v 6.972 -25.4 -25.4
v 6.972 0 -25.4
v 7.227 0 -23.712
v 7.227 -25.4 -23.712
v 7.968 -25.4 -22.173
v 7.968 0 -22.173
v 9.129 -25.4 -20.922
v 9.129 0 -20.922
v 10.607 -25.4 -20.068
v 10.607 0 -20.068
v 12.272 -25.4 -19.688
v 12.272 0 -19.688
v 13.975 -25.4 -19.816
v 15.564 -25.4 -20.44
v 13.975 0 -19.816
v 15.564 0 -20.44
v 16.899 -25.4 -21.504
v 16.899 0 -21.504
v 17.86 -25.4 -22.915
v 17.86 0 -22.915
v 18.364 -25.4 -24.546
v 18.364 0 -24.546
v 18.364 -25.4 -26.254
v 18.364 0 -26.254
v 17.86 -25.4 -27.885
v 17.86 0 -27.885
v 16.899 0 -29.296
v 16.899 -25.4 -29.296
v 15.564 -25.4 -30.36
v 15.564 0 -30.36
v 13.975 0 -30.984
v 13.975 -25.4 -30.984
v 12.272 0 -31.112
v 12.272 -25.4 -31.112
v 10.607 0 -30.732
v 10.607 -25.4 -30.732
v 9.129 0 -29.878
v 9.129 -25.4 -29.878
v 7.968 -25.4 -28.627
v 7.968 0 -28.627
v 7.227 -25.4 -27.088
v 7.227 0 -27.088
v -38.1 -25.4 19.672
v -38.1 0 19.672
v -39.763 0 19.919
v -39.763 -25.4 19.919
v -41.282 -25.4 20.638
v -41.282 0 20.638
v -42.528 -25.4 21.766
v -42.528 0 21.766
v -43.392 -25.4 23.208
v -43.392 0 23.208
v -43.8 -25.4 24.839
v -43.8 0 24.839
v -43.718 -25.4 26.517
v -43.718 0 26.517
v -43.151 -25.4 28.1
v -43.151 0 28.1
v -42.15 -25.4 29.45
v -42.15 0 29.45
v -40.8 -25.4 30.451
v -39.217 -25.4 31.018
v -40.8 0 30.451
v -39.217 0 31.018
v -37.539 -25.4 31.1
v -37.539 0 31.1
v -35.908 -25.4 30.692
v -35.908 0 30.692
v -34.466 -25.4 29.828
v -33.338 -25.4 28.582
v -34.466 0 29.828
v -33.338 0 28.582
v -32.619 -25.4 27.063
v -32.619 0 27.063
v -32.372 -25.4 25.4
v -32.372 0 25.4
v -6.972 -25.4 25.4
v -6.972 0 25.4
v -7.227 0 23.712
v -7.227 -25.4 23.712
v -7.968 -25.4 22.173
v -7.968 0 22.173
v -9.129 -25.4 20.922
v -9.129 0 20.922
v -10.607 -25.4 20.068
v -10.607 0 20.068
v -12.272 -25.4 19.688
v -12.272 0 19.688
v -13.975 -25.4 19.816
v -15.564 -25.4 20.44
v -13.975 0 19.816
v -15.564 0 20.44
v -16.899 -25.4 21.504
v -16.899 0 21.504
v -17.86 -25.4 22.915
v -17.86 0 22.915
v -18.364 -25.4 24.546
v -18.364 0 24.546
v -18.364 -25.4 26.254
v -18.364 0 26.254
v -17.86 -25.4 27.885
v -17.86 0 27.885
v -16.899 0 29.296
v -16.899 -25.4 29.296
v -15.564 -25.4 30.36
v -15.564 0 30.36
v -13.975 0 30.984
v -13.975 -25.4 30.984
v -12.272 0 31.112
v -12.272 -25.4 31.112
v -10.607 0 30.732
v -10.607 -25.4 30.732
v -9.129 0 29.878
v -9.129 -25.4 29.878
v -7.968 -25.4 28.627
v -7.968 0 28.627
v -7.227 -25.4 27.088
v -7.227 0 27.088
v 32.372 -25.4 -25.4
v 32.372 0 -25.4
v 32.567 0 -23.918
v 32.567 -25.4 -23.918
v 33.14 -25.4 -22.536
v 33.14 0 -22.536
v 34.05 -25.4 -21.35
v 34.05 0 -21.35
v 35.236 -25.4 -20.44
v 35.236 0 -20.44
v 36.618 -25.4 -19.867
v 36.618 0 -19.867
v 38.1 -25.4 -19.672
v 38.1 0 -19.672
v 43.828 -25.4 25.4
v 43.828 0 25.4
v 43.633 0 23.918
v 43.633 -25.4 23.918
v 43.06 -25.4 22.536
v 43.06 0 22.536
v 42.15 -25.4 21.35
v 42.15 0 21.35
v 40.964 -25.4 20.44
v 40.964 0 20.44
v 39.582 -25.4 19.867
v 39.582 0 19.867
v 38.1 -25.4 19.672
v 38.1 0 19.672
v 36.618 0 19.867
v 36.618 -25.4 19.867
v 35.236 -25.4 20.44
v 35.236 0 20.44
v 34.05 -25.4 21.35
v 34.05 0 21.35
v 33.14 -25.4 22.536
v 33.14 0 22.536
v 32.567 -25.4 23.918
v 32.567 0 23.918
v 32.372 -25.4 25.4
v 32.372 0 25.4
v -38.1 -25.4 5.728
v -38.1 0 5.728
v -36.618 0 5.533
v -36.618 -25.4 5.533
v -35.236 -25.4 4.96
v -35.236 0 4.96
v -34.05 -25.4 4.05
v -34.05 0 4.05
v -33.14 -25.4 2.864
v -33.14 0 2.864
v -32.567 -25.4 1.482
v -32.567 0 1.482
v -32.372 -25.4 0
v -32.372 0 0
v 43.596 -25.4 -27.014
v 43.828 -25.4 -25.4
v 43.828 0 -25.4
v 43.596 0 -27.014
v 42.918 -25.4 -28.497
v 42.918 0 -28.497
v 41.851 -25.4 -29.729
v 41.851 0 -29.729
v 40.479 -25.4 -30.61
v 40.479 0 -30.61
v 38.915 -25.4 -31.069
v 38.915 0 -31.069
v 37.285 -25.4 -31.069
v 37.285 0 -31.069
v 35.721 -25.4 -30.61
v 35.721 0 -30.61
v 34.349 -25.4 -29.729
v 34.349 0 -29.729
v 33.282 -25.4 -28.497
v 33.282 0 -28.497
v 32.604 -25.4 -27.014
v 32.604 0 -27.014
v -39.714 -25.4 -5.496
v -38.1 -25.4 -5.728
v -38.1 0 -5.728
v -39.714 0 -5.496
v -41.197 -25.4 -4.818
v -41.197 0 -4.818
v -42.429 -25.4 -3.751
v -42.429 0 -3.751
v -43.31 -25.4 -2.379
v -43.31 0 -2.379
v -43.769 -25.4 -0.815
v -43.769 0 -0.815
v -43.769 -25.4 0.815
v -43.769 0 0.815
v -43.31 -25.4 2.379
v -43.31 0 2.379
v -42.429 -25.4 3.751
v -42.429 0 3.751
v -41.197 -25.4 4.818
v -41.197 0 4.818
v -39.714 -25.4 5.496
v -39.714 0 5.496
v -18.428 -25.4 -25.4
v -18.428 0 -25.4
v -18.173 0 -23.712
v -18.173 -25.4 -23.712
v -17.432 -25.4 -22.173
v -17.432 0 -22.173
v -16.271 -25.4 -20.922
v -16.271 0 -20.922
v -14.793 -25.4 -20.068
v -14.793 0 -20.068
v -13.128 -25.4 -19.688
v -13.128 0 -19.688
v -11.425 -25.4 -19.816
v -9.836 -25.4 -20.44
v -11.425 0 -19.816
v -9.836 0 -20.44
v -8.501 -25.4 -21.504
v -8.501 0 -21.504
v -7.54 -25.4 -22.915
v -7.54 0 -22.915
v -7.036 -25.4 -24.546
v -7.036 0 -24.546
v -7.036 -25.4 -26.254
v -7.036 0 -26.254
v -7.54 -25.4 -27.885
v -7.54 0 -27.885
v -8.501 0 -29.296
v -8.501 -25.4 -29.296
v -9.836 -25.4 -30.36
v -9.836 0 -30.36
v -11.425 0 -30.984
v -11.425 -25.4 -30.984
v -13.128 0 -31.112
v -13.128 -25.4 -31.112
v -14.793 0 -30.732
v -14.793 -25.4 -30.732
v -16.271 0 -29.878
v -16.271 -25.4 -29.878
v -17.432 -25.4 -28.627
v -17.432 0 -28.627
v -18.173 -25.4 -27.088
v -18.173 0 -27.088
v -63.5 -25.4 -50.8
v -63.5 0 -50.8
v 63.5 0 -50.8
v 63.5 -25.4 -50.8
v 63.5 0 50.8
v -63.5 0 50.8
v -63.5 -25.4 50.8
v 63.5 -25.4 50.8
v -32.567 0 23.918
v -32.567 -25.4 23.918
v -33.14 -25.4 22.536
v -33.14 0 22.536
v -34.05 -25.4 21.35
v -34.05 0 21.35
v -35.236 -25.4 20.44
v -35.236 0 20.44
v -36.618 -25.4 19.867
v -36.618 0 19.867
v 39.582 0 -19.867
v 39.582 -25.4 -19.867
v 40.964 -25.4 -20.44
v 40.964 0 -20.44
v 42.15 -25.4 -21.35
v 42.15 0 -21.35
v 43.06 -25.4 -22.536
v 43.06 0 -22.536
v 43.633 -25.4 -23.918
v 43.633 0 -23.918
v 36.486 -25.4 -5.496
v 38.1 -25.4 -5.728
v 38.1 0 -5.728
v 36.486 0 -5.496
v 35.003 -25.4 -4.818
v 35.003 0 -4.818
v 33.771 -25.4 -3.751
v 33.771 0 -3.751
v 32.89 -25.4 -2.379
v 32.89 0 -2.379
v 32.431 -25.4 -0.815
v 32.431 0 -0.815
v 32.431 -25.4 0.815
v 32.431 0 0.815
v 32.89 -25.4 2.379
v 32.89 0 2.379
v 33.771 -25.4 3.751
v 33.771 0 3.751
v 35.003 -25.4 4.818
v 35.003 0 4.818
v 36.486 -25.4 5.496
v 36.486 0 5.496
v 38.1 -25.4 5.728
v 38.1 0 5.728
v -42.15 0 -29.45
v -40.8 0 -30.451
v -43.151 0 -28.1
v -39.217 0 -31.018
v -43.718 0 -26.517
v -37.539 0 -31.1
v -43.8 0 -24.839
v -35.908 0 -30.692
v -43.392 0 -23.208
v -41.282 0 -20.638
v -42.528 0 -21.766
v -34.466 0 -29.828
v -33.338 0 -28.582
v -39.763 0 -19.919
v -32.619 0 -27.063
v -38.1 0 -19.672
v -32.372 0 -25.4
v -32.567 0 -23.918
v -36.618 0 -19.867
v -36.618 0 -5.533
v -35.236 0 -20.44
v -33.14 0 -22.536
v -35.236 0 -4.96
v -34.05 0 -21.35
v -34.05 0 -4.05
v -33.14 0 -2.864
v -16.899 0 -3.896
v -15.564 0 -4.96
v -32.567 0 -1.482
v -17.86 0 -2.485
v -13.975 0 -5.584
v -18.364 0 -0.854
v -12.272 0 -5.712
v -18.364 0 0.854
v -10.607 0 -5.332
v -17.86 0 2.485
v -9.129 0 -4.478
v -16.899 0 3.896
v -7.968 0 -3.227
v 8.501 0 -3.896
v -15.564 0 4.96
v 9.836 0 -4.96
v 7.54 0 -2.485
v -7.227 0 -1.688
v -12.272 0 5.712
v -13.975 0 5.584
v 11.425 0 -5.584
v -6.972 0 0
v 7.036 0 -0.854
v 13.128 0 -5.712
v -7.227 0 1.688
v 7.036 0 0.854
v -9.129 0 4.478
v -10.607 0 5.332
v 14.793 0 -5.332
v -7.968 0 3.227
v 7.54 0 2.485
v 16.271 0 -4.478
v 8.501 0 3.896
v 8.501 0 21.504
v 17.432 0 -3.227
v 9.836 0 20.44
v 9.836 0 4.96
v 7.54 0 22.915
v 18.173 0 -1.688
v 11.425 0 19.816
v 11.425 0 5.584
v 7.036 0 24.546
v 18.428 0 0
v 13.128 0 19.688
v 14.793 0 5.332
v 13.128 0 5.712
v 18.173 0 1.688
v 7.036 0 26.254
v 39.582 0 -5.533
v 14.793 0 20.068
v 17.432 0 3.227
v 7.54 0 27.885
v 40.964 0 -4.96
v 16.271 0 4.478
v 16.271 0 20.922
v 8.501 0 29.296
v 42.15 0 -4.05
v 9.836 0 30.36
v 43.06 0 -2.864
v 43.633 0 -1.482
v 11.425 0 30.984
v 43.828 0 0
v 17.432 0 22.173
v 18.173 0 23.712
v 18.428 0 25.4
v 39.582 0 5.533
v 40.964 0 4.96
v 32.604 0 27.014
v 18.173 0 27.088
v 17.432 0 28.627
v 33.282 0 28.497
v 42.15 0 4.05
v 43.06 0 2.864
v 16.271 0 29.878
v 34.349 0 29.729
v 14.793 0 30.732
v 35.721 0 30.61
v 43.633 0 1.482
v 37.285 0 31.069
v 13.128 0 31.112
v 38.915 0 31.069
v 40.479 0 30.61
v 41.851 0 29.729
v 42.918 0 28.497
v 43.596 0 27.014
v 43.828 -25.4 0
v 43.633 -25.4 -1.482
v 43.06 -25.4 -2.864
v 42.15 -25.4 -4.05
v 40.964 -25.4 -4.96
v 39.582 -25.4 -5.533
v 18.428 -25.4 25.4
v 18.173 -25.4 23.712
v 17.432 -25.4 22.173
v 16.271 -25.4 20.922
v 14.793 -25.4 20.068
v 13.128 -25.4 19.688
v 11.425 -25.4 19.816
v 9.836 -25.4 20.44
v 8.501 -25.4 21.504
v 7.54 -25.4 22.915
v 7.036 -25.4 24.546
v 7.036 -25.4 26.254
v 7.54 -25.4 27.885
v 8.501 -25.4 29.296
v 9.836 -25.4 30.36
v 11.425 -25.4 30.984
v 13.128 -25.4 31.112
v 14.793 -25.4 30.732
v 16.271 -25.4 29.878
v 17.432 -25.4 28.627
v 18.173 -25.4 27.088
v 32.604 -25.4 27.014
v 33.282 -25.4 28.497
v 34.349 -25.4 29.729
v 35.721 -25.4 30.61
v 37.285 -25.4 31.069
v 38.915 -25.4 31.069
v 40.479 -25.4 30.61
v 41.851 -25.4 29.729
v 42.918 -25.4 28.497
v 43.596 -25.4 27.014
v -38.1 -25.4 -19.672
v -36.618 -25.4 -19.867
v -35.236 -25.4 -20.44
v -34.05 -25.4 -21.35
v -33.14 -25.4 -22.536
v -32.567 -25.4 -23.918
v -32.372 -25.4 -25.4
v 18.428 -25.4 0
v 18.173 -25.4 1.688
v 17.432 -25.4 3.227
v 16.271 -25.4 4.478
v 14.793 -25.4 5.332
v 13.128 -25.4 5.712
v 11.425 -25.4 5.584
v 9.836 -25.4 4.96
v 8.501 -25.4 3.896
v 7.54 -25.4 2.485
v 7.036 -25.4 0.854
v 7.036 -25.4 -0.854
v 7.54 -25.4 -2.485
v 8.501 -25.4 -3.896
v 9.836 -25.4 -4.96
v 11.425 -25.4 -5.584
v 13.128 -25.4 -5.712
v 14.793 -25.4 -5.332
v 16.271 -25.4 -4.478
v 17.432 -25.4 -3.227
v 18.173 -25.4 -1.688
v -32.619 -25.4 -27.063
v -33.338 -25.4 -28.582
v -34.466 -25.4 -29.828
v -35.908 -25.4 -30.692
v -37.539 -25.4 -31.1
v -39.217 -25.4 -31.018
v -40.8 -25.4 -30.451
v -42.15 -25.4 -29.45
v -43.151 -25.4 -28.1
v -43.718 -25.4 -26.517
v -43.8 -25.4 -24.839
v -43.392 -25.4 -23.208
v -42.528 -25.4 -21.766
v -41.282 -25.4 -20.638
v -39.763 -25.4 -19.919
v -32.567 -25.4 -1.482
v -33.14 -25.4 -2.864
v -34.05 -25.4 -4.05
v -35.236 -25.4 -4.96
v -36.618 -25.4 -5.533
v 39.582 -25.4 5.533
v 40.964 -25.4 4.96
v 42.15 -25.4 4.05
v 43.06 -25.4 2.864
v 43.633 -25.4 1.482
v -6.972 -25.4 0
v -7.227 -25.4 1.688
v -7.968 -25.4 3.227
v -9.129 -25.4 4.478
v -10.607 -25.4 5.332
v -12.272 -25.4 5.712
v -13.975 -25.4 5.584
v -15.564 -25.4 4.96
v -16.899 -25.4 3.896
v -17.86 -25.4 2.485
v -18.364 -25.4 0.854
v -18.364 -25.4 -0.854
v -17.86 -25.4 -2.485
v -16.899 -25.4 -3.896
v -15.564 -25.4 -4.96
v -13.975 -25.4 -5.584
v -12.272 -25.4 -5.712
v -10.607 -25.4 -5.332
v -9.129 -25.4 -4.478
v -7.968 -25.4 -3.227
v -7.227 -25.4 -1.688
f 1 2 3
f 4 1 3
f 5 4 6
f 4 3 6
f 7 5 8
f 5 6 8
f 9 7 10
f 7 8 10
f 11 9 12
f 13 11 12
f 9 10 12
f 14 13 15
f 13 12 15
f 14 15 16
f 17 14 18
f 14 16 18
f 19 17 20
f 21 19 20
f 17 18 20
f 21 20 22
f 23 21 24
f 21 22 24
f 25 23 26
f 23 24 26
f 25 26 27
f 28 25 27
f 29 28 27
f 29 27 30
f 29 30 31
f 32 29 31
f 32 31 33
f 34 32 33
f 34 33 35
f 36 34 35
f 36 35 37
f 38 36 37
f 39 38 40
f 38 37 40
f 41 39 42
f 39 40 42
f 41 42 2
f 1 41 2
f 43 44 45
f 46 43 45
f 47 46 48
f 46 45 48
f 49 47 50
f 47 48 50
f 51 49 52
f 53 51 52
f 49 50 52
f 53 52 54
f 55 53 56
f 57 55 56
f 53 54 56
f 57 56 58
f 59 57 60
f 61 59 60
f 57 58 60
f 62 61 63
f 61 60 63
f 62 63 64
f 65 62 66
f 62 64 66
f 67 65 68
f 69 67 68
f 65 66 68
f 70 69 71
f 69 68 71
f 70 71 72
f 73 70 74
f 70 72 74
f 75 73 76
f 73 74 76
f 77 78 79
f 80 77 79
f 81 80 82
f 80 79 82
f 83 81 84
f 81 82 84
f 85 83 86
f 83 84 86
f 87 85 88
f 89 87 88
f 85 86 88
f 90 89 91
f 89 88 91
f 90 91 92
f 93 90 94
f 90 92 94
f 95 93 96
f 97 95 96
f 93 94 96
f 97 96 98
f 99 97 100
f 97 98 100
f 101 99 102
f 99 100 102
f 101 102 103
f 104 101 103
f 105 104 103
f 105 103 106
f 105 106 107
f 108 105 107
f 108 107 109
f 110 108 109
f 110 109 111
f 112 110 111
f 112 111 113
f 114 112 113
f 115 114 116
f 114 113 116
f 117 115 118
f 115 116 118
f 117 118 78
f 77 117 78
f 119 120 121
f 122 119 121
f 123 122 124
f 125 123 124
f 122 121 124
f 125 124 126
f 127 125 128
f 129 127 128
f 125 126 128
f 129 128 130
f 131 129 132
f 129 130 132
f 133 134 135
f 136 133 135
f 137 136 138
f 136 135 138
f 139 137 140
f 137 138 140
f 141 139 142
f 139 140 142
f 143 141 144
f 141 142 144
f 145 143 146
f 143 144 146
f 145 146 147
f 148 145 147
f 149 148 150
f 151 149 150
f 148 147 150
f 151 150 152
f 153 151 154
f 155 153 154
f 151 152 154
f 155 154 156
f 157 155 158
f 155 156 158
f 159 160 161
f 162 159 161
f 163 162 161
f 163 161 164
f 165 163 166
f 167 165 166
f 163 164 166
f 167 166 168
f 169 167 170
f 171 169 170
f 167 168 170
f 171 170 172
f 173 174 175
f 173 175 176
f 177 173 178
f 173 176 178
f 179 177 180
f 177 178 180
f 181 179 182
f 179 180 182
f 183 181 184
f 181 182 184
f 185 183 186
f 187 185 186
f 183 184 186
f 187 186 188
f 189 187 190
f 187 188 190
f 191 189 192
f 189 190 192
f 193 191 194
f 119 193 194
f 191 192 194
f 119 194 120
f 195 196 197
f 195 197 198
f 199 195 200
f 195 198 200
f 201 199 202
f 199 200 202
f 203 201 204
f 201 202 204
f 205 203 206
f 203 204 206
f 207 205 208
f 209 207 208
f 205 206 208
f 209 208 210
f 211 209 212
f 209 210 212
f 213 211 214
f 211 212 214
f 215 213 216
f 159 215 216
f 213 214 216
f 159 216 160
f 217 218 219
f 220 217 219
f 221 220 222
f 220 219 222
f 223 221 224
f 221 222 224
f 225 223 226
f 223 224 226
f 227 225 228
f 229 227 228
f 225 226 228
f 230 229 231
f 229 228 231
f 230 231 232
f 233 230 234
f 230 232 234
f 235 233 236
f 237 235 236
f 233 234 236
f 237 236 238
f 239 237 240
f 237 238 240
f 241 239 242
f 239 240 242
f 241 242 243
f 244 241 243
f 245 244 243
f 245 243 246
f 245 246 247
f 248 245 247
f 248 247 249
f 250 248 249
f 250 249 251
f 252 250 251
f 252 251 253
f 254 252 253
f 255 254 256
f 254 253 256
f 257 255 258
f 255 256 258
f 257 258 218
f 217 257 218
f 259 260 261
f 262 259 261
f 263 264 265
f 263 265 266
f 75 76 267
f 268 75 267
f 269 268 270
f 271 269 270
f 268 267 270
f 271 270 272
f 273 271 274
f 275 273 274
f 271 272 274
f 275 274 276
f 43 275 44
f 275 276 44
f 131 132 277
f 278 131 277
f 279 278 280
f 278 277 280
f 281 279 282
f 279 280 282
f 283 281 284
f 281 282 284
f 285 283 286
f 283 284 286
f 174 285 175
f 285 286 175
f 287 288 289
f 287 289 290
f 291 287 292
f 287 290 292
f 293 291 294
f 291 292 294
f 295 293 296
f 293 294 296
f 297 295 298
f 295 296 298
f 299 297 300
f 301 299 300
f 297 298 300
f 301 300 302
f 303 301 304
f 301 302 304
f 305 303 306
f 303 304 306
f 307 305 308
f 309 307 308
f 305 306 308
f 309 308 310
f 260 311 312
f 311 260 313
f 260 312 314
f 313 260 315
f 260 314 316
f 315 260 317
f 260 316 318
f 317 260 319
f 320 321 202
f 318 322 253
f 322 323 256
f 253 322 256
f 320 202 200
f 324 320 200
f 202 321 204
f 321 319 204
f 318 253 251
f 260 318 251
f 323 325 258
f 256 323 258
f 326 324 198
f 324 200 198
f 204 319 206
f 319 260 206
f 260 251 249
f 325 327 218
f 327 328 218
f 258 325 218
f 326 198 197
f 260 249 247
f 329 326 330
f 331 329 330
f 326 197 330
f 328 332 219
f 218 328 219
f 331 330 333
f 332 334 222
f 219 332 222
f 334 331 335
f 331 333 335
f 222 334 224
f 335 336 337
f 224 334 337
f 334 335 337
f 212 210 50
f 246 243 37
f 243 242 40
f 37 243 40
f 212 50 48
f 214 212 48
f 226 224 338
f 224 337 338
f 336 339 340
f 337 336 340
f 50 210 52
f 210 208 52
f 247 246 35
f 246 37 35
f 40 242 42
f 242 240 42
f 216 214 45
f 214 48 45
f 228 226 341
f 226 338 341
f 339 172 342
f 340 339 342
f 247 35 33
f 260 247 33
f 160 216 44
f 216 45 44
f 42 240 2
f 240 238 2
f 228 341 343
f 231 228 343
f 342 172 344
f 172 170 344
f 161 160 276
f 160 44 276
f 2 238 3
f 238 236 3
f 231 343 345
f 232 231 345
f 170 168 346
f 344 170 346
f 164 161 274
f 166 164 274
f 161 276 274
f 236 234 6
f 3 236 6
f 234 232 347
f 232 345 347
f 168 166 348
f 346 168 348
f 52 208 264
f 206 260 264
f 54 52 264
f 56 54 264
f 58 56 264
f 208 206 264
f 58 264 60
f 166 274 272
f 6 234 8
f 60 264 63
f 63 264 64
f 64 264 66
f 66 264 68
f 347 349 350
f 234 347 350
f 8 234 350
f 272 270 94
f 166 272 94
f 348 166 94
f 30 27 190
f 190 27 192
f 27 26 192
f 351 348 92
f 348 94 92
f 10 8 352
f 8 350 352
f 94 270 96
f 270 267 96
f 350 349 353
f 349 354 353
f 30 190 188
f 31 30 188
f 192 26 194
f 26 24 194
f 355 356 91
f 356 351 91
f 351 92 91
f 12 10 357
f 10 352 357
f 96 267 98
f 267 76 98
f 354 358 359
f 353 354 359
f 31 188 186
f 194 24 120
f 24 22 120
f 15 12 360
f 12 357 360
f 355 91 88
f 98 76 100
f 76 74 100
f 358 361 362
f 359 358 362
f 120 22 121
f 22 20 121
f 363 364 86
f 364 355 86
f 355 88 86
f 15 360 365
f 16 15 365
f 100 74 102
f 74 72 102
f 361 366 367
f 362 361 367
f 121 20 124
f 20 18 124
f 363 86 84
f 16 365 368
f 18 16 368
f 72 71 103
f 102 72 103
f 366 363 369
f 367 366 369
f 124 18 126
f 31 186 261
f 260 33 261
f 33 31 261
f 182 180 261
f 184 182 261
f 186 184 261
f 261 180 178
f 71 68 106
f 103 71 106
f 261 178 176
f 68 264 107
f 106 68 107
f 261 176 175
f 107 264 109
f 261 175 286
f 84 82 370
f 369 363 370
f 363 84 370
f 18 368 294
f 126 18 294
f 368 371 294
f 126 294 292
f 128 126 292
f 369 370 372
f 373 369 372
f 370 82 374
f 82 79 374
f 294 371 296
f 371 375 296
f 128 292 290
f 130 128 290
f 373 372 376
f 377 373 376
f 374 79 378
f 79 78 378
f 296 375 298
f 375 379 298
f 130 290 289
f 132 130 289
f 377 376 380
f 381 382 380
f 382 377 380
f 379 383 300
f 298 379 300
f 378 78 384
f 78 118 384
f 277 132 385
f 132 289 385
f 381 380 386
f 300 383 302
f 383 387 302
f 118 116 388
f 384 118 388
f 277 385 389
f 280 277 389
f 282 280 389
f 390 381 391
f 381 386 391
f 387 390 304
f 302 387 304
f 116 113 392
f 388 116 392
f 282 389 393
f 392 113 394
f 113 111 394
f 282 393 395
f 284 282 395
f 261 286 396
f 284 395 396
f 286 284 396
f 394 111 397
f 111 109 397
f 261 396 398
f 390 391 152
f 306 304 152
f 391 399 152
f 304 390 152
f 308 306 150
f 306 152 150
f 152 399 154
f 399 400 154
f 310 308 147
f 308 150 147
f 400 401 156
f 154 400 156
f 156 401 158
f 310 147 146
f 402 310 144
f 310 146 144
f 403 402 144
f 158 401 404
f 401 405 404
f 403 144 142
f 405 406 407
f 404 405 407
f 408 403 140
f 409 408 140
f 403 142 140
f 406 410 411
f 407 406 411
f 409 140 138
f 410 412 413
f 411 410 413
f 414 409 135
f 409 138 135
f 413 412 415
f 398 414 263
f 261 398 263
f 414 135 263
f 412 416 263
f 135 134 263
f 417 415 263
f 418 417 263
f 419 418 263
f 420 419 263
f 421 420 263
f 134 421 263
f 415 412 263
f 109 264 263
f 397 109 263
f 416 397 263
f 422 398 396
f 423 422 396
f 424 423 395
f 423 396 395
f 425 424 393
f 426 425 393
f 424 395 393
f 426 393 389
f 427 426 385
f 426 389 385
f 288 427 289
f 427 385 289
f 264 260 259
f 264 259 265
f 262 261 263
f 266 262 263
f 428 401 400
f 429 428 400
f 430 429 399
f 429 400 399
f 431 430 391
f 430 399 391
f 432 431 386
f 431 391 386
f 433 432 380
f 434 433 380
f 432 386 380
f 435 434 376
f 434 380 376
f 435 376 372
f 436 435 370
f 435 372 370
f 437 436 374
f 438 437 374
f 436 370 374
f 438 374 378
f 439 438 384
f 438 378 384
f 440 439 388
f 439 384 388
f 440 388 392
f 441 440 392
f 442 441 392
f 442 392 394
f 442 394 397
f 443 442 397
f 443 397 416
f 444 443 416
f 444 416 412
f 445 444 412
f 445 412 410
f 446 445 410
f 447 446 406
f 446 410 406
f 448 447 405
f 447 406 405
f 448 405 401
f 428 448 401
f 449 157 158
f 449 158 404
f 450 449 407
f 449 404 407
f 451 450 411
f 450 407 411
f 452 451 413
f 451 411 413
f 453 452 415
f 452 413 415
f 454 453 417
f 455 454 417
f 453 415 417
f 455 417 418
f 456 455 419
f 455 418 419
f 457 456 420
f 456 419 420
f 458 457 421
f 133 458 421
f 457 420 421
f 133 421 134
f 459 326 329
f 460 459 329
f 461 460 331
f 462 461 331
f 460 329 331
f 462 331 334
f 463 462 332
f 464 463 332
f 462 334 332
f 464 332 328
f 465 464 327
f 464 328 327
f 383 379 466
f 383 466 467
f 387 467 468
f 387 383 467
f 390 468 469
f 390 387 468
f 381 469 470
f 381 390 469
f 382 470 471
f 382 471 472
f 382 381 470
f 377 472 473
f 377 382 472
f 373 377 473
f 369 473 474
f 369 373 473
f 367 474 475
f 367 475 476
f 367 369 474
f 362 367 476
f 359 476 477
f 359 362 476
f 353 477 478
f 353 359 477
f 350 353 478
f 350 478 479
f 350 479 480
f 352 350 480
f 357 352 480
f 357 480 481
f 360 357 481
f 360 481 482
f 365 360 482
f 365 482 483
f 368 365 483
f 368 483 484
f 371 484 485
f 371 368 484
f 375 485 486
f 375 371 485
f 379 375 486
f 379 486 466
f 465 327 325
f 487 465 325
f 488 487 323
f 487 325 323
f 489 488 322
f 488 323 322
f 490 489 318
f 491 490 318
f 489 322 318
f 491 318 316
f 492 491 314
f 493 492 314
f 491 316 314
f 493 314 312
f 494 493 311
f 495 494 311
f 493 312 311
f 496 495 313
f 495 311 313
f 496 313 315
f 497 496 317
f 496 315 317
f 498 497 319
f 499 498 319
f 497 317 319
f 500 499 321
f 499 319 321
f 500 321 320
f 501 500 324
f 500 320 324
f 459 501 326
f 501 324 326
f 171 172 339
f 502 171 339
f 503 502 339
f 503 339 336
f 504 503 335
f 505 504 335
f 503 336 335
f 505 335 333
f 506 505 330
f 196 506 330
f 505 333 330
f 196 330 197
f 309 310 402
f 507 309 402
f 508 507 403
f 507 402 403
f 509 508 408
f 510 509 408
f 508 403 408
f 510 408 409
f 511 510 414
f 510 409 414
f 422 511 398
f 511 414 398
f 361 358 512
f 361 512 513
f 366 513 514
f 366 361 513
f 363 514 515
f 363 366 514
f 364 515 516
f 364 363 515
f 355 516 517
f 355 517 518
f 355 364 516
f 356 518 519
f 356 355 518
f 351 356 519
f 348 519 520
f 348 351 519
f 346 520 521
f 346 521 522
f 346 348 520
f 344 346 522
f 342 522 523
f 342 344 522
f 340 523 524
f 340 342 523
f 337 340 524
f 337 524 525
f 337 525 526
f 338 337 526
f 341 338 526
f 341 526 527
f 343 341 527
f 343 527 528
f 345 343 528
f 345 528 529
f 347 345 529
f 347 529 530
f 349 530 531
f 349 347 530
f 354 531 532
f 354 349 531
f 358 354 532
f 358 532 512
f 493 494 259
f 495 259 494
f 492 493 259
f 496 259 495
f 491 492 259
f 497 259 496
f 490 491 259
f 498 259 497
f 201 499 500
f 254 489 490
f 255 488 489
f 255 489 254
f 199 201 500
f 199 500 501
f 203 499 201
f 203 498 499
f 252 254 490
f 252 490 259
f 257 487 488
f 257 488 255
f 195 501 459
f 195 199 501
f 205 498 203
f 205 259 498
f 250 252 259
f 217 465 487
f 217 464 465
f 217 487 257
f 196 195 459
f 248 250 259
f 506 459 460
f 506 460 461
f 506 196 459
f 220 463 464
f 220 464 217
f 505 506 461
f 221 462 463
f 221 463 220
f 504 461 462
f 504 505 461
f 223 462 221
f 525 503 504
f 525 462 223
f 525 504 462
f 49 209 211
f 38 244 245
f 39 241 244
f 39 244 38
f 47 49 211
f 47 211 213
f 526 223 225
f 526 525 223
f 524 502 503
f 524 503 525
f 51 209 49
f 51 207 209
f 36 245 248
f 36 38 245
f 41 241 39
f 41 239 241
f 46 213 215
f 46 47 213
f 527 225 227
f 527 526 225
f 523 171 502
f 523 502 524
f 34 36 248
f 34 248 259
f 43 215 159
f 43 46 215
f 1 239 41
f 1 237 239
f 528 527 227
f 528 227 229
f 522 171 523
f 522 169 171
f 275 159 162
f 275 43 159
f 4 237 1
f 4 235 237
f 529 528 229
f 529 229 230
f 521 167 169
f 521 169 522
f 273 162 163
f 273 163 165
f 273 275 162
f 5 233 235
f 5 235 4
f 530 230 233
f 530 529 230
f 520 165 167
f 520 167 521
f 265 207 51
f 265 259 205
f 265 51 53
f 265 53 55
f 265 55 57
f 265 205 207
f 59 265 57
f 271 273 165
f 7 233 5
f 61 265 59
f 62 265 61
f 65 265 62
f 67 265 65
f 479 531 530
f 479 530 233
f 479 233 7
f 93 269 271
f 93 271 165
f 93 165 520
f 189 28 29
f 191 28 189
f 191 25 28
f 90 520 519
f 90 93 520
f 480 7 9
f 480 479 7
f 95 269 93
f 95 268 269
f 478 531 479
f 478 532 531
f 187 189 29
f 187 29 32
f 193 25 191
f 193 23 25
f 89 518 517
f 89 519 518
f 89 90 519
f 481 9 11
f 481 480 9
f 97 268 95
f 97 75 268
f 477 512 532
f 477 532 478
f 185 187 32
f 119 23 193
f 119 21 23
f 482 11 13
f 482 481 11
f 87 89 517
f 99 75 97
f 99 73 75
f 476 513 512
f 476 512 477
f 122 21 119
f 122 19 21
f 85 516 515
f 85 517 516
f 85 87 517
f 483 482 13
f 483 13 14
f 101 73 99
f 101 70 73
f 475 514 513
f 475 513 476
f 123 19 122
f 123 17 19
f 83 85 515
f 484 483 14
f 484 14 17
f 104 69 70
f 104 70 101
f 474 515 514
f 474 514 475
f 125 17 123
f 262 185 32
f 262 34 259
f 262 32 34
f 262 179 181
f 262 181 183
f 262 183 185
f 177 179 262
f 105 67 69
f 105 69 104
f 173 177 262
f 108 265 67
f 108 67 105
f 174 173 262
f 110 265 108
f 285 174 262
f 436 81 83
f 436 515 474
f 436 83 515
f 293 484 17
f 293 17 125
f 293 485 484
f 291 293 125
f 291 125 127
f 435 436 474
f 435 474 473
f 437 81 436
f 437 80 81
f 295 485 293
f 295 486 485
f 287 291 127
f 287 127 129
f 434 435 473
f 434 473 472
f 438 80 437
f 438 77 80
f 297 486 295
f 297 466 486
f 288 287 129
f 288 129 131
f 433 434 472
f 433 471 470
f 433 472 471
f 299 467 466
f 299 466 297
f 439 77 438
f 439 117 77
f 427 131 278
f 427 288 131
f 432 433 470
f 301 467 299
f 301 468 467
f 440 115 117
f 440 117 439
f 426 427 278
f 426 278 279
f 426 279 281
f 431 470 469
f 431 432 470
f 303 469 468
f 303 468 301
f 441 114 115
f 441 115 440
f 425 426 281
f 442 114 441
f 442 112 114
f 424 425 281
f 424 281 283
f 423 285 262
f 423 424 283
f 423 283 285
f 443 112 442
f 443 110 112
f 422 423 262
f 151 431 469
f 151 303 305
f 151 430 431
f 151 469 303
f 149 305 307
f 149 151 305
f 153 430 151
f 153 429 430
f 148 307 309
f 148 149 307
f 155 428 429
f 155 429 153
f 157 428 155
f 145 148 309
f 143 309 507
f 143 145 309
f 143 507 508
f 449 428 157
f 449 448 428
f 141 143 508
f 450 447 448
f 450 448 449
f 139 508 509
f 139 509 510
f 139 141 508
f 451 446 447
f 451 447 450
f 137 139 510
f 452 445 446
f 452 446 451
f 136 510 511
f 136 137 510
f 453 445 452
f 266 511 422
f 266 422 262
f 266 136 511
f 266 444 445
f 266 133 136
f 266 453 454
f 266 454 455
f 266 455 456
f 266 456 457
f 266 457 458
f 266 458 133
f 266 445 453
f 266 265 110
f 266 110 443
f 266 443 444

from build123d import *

# Parameters (mm, degrees)
F0_W     = 127
F0_H     = 101.6
F0_R     = 5.7277
F1_DEPTH = 25.4


with BuildPart() as f1:
    # F0 (on Front) → F1 (new body)
    with BuildSketch(Plane.XZ):
        Rectangle(F0_W, F0_H)
        with BuildLine():
            ThreePointArc((-38.1, 19.6723), (-42.150096, 29.450096), (-32.3723, 25.4))
            Line((-32.3723, 25.4), (-18.4277, 25.4))
            ThreePointArc((-18.4277, 25.4), (-12.7, 31.1277), (-6.9723, 25.4))
            Line((-6.9723, 25.4), (6.9723, 25.4))
            ThreePointArc((6.9723, 25.4), (12.7, 31.1277), (18.4277, 25.4))
            Line((18.4277, 25.4), (32.3723, 25.4))
            ThreePointArc((32.3723, 25.4), (38.1, 31.1277), (43.8277, 25.4))
            ThreePointArc((43.8277, 25.4), (42.150096, 21.349904), (38.1, 19.6723))
            Line((38.1, 19.6723), (38.1, 5.7277))
            ThreePointArc((38.1, 5.7277), (42.150096, 4.050096), (43.8277, 0))
            ThreePointArc((43.8277, 0), (42.150096, -4.050096), (38.1, -5.7277))
            Line((38.1, -5.7277), (38.1, -19.6723))
            ThreePointArc((38.1, -19.6723), (42.150096, -21.349904), (43.8277, -25.4))
            ThreePointArc((43.8277, -25.4), (38.1, -31.1277), (32.3723, -25.4))
            Line((32.3723, -25.4), (18.4277, -25.4))
            ThreePointArc((18.4277, -25.4), (12.7, -31.1277), (6.9723, -25.4))
            Line((6.9723, -25.4), (-6.9723, -25.4))
            ThreePointArc((-6.9723, -25.4), (-12.7, -31.1277), (-18.4277, -25.4))
            Line((-18.4277, -25.4), (-32.3723, -25.4))
            ThreePointArc((-32.3723, -25.4), (-42.150096, -29.450096), (-38.1, -19.6723))
            Line((-38.1, -19.6723), (-38.1, -5.7277))
            ThreePointArc((-38.1, -5.7277), (-43.8277, 0), (-38.1, 5.7277))
            Line((-38.1, 5.7277), (-38.1, 19.6723))
        make_face(mode=Mode.SUBTRACT)
        with BuildLine():
            Line((-18.4277, 25.4), (-32.3723, 25.4))
            ThreePointArc((-32.3723, 25.4), (-34.049904, 21.349904), (-38.1, 19.6723))
            Line((-38.1, 19.6723), (-38.1, 5.7277))
            ThreePointArc((-38.1, 5.7277), (-34.049904, 4.050096), (-32.3723, 0))
            ThreePointArc((-32.3723, 0), (-34.049904, -4.050096), (-38.1, -5.7277))
            Line((-38.1, -5.7277), (-38.1, -19.6723))
            ThreePointArc((-38.1, -19.6723), (-34.049904, -21.349904), (-32.3723, -25.4))
            Line((-32.3723, -25.4), (-18.4277, -25.4))
            ThreePointArc((-18.4277, -25.4), (-12.7, -19.6723), (-6.9723, -25.4))
            Line((-6.9723, -25.4), (6.9723, -25.4))
            ThreePointArc((6.9723, -25.4), (12.7, -19.6723), (18.4277, -25.4))
            Line((18.4277, -25.4), (32.3723, -25.4))
            ThreePointArc((32.3723, -25.4), (34.049904, -21.349904), (38.1, -19.6723))
            Line((38.1, -19.6723), (38.1, -5.7277))
            ThreePointArc((38.1, -5.7277), (32.3723, 0), (38.1, 5.7277))
            Line((38.1, 5.7277), (38.1, 19.6723))
            ThreePointArc((38.1, 19.6723), (34.049904, 21.349904), (32.3723, 25.4))
            Line((32.3723, 25.4), (18.4277, 25.4))
            ThreePointArc((18.4277, 25.4), (12.7, 19.6723), (6.9723, 25.4))
            Line((6.9723, 25.4), (-6.9723, 25.4))
            ThreePointArc((-6.9723, 25.4), (-12.7, 19.6723), (-18.4277, 25.4))
        make_face()
        with Locations((-12.7, 0)):
            Circle(F0_R, mode=Mode.SUBTRACT)
        with Locations((12.7, 0)):
            Circle(F0_R, mode=Mode.SUBTRACT)
    extrude(amount=F1_DEPTH)


solid = f1.part
